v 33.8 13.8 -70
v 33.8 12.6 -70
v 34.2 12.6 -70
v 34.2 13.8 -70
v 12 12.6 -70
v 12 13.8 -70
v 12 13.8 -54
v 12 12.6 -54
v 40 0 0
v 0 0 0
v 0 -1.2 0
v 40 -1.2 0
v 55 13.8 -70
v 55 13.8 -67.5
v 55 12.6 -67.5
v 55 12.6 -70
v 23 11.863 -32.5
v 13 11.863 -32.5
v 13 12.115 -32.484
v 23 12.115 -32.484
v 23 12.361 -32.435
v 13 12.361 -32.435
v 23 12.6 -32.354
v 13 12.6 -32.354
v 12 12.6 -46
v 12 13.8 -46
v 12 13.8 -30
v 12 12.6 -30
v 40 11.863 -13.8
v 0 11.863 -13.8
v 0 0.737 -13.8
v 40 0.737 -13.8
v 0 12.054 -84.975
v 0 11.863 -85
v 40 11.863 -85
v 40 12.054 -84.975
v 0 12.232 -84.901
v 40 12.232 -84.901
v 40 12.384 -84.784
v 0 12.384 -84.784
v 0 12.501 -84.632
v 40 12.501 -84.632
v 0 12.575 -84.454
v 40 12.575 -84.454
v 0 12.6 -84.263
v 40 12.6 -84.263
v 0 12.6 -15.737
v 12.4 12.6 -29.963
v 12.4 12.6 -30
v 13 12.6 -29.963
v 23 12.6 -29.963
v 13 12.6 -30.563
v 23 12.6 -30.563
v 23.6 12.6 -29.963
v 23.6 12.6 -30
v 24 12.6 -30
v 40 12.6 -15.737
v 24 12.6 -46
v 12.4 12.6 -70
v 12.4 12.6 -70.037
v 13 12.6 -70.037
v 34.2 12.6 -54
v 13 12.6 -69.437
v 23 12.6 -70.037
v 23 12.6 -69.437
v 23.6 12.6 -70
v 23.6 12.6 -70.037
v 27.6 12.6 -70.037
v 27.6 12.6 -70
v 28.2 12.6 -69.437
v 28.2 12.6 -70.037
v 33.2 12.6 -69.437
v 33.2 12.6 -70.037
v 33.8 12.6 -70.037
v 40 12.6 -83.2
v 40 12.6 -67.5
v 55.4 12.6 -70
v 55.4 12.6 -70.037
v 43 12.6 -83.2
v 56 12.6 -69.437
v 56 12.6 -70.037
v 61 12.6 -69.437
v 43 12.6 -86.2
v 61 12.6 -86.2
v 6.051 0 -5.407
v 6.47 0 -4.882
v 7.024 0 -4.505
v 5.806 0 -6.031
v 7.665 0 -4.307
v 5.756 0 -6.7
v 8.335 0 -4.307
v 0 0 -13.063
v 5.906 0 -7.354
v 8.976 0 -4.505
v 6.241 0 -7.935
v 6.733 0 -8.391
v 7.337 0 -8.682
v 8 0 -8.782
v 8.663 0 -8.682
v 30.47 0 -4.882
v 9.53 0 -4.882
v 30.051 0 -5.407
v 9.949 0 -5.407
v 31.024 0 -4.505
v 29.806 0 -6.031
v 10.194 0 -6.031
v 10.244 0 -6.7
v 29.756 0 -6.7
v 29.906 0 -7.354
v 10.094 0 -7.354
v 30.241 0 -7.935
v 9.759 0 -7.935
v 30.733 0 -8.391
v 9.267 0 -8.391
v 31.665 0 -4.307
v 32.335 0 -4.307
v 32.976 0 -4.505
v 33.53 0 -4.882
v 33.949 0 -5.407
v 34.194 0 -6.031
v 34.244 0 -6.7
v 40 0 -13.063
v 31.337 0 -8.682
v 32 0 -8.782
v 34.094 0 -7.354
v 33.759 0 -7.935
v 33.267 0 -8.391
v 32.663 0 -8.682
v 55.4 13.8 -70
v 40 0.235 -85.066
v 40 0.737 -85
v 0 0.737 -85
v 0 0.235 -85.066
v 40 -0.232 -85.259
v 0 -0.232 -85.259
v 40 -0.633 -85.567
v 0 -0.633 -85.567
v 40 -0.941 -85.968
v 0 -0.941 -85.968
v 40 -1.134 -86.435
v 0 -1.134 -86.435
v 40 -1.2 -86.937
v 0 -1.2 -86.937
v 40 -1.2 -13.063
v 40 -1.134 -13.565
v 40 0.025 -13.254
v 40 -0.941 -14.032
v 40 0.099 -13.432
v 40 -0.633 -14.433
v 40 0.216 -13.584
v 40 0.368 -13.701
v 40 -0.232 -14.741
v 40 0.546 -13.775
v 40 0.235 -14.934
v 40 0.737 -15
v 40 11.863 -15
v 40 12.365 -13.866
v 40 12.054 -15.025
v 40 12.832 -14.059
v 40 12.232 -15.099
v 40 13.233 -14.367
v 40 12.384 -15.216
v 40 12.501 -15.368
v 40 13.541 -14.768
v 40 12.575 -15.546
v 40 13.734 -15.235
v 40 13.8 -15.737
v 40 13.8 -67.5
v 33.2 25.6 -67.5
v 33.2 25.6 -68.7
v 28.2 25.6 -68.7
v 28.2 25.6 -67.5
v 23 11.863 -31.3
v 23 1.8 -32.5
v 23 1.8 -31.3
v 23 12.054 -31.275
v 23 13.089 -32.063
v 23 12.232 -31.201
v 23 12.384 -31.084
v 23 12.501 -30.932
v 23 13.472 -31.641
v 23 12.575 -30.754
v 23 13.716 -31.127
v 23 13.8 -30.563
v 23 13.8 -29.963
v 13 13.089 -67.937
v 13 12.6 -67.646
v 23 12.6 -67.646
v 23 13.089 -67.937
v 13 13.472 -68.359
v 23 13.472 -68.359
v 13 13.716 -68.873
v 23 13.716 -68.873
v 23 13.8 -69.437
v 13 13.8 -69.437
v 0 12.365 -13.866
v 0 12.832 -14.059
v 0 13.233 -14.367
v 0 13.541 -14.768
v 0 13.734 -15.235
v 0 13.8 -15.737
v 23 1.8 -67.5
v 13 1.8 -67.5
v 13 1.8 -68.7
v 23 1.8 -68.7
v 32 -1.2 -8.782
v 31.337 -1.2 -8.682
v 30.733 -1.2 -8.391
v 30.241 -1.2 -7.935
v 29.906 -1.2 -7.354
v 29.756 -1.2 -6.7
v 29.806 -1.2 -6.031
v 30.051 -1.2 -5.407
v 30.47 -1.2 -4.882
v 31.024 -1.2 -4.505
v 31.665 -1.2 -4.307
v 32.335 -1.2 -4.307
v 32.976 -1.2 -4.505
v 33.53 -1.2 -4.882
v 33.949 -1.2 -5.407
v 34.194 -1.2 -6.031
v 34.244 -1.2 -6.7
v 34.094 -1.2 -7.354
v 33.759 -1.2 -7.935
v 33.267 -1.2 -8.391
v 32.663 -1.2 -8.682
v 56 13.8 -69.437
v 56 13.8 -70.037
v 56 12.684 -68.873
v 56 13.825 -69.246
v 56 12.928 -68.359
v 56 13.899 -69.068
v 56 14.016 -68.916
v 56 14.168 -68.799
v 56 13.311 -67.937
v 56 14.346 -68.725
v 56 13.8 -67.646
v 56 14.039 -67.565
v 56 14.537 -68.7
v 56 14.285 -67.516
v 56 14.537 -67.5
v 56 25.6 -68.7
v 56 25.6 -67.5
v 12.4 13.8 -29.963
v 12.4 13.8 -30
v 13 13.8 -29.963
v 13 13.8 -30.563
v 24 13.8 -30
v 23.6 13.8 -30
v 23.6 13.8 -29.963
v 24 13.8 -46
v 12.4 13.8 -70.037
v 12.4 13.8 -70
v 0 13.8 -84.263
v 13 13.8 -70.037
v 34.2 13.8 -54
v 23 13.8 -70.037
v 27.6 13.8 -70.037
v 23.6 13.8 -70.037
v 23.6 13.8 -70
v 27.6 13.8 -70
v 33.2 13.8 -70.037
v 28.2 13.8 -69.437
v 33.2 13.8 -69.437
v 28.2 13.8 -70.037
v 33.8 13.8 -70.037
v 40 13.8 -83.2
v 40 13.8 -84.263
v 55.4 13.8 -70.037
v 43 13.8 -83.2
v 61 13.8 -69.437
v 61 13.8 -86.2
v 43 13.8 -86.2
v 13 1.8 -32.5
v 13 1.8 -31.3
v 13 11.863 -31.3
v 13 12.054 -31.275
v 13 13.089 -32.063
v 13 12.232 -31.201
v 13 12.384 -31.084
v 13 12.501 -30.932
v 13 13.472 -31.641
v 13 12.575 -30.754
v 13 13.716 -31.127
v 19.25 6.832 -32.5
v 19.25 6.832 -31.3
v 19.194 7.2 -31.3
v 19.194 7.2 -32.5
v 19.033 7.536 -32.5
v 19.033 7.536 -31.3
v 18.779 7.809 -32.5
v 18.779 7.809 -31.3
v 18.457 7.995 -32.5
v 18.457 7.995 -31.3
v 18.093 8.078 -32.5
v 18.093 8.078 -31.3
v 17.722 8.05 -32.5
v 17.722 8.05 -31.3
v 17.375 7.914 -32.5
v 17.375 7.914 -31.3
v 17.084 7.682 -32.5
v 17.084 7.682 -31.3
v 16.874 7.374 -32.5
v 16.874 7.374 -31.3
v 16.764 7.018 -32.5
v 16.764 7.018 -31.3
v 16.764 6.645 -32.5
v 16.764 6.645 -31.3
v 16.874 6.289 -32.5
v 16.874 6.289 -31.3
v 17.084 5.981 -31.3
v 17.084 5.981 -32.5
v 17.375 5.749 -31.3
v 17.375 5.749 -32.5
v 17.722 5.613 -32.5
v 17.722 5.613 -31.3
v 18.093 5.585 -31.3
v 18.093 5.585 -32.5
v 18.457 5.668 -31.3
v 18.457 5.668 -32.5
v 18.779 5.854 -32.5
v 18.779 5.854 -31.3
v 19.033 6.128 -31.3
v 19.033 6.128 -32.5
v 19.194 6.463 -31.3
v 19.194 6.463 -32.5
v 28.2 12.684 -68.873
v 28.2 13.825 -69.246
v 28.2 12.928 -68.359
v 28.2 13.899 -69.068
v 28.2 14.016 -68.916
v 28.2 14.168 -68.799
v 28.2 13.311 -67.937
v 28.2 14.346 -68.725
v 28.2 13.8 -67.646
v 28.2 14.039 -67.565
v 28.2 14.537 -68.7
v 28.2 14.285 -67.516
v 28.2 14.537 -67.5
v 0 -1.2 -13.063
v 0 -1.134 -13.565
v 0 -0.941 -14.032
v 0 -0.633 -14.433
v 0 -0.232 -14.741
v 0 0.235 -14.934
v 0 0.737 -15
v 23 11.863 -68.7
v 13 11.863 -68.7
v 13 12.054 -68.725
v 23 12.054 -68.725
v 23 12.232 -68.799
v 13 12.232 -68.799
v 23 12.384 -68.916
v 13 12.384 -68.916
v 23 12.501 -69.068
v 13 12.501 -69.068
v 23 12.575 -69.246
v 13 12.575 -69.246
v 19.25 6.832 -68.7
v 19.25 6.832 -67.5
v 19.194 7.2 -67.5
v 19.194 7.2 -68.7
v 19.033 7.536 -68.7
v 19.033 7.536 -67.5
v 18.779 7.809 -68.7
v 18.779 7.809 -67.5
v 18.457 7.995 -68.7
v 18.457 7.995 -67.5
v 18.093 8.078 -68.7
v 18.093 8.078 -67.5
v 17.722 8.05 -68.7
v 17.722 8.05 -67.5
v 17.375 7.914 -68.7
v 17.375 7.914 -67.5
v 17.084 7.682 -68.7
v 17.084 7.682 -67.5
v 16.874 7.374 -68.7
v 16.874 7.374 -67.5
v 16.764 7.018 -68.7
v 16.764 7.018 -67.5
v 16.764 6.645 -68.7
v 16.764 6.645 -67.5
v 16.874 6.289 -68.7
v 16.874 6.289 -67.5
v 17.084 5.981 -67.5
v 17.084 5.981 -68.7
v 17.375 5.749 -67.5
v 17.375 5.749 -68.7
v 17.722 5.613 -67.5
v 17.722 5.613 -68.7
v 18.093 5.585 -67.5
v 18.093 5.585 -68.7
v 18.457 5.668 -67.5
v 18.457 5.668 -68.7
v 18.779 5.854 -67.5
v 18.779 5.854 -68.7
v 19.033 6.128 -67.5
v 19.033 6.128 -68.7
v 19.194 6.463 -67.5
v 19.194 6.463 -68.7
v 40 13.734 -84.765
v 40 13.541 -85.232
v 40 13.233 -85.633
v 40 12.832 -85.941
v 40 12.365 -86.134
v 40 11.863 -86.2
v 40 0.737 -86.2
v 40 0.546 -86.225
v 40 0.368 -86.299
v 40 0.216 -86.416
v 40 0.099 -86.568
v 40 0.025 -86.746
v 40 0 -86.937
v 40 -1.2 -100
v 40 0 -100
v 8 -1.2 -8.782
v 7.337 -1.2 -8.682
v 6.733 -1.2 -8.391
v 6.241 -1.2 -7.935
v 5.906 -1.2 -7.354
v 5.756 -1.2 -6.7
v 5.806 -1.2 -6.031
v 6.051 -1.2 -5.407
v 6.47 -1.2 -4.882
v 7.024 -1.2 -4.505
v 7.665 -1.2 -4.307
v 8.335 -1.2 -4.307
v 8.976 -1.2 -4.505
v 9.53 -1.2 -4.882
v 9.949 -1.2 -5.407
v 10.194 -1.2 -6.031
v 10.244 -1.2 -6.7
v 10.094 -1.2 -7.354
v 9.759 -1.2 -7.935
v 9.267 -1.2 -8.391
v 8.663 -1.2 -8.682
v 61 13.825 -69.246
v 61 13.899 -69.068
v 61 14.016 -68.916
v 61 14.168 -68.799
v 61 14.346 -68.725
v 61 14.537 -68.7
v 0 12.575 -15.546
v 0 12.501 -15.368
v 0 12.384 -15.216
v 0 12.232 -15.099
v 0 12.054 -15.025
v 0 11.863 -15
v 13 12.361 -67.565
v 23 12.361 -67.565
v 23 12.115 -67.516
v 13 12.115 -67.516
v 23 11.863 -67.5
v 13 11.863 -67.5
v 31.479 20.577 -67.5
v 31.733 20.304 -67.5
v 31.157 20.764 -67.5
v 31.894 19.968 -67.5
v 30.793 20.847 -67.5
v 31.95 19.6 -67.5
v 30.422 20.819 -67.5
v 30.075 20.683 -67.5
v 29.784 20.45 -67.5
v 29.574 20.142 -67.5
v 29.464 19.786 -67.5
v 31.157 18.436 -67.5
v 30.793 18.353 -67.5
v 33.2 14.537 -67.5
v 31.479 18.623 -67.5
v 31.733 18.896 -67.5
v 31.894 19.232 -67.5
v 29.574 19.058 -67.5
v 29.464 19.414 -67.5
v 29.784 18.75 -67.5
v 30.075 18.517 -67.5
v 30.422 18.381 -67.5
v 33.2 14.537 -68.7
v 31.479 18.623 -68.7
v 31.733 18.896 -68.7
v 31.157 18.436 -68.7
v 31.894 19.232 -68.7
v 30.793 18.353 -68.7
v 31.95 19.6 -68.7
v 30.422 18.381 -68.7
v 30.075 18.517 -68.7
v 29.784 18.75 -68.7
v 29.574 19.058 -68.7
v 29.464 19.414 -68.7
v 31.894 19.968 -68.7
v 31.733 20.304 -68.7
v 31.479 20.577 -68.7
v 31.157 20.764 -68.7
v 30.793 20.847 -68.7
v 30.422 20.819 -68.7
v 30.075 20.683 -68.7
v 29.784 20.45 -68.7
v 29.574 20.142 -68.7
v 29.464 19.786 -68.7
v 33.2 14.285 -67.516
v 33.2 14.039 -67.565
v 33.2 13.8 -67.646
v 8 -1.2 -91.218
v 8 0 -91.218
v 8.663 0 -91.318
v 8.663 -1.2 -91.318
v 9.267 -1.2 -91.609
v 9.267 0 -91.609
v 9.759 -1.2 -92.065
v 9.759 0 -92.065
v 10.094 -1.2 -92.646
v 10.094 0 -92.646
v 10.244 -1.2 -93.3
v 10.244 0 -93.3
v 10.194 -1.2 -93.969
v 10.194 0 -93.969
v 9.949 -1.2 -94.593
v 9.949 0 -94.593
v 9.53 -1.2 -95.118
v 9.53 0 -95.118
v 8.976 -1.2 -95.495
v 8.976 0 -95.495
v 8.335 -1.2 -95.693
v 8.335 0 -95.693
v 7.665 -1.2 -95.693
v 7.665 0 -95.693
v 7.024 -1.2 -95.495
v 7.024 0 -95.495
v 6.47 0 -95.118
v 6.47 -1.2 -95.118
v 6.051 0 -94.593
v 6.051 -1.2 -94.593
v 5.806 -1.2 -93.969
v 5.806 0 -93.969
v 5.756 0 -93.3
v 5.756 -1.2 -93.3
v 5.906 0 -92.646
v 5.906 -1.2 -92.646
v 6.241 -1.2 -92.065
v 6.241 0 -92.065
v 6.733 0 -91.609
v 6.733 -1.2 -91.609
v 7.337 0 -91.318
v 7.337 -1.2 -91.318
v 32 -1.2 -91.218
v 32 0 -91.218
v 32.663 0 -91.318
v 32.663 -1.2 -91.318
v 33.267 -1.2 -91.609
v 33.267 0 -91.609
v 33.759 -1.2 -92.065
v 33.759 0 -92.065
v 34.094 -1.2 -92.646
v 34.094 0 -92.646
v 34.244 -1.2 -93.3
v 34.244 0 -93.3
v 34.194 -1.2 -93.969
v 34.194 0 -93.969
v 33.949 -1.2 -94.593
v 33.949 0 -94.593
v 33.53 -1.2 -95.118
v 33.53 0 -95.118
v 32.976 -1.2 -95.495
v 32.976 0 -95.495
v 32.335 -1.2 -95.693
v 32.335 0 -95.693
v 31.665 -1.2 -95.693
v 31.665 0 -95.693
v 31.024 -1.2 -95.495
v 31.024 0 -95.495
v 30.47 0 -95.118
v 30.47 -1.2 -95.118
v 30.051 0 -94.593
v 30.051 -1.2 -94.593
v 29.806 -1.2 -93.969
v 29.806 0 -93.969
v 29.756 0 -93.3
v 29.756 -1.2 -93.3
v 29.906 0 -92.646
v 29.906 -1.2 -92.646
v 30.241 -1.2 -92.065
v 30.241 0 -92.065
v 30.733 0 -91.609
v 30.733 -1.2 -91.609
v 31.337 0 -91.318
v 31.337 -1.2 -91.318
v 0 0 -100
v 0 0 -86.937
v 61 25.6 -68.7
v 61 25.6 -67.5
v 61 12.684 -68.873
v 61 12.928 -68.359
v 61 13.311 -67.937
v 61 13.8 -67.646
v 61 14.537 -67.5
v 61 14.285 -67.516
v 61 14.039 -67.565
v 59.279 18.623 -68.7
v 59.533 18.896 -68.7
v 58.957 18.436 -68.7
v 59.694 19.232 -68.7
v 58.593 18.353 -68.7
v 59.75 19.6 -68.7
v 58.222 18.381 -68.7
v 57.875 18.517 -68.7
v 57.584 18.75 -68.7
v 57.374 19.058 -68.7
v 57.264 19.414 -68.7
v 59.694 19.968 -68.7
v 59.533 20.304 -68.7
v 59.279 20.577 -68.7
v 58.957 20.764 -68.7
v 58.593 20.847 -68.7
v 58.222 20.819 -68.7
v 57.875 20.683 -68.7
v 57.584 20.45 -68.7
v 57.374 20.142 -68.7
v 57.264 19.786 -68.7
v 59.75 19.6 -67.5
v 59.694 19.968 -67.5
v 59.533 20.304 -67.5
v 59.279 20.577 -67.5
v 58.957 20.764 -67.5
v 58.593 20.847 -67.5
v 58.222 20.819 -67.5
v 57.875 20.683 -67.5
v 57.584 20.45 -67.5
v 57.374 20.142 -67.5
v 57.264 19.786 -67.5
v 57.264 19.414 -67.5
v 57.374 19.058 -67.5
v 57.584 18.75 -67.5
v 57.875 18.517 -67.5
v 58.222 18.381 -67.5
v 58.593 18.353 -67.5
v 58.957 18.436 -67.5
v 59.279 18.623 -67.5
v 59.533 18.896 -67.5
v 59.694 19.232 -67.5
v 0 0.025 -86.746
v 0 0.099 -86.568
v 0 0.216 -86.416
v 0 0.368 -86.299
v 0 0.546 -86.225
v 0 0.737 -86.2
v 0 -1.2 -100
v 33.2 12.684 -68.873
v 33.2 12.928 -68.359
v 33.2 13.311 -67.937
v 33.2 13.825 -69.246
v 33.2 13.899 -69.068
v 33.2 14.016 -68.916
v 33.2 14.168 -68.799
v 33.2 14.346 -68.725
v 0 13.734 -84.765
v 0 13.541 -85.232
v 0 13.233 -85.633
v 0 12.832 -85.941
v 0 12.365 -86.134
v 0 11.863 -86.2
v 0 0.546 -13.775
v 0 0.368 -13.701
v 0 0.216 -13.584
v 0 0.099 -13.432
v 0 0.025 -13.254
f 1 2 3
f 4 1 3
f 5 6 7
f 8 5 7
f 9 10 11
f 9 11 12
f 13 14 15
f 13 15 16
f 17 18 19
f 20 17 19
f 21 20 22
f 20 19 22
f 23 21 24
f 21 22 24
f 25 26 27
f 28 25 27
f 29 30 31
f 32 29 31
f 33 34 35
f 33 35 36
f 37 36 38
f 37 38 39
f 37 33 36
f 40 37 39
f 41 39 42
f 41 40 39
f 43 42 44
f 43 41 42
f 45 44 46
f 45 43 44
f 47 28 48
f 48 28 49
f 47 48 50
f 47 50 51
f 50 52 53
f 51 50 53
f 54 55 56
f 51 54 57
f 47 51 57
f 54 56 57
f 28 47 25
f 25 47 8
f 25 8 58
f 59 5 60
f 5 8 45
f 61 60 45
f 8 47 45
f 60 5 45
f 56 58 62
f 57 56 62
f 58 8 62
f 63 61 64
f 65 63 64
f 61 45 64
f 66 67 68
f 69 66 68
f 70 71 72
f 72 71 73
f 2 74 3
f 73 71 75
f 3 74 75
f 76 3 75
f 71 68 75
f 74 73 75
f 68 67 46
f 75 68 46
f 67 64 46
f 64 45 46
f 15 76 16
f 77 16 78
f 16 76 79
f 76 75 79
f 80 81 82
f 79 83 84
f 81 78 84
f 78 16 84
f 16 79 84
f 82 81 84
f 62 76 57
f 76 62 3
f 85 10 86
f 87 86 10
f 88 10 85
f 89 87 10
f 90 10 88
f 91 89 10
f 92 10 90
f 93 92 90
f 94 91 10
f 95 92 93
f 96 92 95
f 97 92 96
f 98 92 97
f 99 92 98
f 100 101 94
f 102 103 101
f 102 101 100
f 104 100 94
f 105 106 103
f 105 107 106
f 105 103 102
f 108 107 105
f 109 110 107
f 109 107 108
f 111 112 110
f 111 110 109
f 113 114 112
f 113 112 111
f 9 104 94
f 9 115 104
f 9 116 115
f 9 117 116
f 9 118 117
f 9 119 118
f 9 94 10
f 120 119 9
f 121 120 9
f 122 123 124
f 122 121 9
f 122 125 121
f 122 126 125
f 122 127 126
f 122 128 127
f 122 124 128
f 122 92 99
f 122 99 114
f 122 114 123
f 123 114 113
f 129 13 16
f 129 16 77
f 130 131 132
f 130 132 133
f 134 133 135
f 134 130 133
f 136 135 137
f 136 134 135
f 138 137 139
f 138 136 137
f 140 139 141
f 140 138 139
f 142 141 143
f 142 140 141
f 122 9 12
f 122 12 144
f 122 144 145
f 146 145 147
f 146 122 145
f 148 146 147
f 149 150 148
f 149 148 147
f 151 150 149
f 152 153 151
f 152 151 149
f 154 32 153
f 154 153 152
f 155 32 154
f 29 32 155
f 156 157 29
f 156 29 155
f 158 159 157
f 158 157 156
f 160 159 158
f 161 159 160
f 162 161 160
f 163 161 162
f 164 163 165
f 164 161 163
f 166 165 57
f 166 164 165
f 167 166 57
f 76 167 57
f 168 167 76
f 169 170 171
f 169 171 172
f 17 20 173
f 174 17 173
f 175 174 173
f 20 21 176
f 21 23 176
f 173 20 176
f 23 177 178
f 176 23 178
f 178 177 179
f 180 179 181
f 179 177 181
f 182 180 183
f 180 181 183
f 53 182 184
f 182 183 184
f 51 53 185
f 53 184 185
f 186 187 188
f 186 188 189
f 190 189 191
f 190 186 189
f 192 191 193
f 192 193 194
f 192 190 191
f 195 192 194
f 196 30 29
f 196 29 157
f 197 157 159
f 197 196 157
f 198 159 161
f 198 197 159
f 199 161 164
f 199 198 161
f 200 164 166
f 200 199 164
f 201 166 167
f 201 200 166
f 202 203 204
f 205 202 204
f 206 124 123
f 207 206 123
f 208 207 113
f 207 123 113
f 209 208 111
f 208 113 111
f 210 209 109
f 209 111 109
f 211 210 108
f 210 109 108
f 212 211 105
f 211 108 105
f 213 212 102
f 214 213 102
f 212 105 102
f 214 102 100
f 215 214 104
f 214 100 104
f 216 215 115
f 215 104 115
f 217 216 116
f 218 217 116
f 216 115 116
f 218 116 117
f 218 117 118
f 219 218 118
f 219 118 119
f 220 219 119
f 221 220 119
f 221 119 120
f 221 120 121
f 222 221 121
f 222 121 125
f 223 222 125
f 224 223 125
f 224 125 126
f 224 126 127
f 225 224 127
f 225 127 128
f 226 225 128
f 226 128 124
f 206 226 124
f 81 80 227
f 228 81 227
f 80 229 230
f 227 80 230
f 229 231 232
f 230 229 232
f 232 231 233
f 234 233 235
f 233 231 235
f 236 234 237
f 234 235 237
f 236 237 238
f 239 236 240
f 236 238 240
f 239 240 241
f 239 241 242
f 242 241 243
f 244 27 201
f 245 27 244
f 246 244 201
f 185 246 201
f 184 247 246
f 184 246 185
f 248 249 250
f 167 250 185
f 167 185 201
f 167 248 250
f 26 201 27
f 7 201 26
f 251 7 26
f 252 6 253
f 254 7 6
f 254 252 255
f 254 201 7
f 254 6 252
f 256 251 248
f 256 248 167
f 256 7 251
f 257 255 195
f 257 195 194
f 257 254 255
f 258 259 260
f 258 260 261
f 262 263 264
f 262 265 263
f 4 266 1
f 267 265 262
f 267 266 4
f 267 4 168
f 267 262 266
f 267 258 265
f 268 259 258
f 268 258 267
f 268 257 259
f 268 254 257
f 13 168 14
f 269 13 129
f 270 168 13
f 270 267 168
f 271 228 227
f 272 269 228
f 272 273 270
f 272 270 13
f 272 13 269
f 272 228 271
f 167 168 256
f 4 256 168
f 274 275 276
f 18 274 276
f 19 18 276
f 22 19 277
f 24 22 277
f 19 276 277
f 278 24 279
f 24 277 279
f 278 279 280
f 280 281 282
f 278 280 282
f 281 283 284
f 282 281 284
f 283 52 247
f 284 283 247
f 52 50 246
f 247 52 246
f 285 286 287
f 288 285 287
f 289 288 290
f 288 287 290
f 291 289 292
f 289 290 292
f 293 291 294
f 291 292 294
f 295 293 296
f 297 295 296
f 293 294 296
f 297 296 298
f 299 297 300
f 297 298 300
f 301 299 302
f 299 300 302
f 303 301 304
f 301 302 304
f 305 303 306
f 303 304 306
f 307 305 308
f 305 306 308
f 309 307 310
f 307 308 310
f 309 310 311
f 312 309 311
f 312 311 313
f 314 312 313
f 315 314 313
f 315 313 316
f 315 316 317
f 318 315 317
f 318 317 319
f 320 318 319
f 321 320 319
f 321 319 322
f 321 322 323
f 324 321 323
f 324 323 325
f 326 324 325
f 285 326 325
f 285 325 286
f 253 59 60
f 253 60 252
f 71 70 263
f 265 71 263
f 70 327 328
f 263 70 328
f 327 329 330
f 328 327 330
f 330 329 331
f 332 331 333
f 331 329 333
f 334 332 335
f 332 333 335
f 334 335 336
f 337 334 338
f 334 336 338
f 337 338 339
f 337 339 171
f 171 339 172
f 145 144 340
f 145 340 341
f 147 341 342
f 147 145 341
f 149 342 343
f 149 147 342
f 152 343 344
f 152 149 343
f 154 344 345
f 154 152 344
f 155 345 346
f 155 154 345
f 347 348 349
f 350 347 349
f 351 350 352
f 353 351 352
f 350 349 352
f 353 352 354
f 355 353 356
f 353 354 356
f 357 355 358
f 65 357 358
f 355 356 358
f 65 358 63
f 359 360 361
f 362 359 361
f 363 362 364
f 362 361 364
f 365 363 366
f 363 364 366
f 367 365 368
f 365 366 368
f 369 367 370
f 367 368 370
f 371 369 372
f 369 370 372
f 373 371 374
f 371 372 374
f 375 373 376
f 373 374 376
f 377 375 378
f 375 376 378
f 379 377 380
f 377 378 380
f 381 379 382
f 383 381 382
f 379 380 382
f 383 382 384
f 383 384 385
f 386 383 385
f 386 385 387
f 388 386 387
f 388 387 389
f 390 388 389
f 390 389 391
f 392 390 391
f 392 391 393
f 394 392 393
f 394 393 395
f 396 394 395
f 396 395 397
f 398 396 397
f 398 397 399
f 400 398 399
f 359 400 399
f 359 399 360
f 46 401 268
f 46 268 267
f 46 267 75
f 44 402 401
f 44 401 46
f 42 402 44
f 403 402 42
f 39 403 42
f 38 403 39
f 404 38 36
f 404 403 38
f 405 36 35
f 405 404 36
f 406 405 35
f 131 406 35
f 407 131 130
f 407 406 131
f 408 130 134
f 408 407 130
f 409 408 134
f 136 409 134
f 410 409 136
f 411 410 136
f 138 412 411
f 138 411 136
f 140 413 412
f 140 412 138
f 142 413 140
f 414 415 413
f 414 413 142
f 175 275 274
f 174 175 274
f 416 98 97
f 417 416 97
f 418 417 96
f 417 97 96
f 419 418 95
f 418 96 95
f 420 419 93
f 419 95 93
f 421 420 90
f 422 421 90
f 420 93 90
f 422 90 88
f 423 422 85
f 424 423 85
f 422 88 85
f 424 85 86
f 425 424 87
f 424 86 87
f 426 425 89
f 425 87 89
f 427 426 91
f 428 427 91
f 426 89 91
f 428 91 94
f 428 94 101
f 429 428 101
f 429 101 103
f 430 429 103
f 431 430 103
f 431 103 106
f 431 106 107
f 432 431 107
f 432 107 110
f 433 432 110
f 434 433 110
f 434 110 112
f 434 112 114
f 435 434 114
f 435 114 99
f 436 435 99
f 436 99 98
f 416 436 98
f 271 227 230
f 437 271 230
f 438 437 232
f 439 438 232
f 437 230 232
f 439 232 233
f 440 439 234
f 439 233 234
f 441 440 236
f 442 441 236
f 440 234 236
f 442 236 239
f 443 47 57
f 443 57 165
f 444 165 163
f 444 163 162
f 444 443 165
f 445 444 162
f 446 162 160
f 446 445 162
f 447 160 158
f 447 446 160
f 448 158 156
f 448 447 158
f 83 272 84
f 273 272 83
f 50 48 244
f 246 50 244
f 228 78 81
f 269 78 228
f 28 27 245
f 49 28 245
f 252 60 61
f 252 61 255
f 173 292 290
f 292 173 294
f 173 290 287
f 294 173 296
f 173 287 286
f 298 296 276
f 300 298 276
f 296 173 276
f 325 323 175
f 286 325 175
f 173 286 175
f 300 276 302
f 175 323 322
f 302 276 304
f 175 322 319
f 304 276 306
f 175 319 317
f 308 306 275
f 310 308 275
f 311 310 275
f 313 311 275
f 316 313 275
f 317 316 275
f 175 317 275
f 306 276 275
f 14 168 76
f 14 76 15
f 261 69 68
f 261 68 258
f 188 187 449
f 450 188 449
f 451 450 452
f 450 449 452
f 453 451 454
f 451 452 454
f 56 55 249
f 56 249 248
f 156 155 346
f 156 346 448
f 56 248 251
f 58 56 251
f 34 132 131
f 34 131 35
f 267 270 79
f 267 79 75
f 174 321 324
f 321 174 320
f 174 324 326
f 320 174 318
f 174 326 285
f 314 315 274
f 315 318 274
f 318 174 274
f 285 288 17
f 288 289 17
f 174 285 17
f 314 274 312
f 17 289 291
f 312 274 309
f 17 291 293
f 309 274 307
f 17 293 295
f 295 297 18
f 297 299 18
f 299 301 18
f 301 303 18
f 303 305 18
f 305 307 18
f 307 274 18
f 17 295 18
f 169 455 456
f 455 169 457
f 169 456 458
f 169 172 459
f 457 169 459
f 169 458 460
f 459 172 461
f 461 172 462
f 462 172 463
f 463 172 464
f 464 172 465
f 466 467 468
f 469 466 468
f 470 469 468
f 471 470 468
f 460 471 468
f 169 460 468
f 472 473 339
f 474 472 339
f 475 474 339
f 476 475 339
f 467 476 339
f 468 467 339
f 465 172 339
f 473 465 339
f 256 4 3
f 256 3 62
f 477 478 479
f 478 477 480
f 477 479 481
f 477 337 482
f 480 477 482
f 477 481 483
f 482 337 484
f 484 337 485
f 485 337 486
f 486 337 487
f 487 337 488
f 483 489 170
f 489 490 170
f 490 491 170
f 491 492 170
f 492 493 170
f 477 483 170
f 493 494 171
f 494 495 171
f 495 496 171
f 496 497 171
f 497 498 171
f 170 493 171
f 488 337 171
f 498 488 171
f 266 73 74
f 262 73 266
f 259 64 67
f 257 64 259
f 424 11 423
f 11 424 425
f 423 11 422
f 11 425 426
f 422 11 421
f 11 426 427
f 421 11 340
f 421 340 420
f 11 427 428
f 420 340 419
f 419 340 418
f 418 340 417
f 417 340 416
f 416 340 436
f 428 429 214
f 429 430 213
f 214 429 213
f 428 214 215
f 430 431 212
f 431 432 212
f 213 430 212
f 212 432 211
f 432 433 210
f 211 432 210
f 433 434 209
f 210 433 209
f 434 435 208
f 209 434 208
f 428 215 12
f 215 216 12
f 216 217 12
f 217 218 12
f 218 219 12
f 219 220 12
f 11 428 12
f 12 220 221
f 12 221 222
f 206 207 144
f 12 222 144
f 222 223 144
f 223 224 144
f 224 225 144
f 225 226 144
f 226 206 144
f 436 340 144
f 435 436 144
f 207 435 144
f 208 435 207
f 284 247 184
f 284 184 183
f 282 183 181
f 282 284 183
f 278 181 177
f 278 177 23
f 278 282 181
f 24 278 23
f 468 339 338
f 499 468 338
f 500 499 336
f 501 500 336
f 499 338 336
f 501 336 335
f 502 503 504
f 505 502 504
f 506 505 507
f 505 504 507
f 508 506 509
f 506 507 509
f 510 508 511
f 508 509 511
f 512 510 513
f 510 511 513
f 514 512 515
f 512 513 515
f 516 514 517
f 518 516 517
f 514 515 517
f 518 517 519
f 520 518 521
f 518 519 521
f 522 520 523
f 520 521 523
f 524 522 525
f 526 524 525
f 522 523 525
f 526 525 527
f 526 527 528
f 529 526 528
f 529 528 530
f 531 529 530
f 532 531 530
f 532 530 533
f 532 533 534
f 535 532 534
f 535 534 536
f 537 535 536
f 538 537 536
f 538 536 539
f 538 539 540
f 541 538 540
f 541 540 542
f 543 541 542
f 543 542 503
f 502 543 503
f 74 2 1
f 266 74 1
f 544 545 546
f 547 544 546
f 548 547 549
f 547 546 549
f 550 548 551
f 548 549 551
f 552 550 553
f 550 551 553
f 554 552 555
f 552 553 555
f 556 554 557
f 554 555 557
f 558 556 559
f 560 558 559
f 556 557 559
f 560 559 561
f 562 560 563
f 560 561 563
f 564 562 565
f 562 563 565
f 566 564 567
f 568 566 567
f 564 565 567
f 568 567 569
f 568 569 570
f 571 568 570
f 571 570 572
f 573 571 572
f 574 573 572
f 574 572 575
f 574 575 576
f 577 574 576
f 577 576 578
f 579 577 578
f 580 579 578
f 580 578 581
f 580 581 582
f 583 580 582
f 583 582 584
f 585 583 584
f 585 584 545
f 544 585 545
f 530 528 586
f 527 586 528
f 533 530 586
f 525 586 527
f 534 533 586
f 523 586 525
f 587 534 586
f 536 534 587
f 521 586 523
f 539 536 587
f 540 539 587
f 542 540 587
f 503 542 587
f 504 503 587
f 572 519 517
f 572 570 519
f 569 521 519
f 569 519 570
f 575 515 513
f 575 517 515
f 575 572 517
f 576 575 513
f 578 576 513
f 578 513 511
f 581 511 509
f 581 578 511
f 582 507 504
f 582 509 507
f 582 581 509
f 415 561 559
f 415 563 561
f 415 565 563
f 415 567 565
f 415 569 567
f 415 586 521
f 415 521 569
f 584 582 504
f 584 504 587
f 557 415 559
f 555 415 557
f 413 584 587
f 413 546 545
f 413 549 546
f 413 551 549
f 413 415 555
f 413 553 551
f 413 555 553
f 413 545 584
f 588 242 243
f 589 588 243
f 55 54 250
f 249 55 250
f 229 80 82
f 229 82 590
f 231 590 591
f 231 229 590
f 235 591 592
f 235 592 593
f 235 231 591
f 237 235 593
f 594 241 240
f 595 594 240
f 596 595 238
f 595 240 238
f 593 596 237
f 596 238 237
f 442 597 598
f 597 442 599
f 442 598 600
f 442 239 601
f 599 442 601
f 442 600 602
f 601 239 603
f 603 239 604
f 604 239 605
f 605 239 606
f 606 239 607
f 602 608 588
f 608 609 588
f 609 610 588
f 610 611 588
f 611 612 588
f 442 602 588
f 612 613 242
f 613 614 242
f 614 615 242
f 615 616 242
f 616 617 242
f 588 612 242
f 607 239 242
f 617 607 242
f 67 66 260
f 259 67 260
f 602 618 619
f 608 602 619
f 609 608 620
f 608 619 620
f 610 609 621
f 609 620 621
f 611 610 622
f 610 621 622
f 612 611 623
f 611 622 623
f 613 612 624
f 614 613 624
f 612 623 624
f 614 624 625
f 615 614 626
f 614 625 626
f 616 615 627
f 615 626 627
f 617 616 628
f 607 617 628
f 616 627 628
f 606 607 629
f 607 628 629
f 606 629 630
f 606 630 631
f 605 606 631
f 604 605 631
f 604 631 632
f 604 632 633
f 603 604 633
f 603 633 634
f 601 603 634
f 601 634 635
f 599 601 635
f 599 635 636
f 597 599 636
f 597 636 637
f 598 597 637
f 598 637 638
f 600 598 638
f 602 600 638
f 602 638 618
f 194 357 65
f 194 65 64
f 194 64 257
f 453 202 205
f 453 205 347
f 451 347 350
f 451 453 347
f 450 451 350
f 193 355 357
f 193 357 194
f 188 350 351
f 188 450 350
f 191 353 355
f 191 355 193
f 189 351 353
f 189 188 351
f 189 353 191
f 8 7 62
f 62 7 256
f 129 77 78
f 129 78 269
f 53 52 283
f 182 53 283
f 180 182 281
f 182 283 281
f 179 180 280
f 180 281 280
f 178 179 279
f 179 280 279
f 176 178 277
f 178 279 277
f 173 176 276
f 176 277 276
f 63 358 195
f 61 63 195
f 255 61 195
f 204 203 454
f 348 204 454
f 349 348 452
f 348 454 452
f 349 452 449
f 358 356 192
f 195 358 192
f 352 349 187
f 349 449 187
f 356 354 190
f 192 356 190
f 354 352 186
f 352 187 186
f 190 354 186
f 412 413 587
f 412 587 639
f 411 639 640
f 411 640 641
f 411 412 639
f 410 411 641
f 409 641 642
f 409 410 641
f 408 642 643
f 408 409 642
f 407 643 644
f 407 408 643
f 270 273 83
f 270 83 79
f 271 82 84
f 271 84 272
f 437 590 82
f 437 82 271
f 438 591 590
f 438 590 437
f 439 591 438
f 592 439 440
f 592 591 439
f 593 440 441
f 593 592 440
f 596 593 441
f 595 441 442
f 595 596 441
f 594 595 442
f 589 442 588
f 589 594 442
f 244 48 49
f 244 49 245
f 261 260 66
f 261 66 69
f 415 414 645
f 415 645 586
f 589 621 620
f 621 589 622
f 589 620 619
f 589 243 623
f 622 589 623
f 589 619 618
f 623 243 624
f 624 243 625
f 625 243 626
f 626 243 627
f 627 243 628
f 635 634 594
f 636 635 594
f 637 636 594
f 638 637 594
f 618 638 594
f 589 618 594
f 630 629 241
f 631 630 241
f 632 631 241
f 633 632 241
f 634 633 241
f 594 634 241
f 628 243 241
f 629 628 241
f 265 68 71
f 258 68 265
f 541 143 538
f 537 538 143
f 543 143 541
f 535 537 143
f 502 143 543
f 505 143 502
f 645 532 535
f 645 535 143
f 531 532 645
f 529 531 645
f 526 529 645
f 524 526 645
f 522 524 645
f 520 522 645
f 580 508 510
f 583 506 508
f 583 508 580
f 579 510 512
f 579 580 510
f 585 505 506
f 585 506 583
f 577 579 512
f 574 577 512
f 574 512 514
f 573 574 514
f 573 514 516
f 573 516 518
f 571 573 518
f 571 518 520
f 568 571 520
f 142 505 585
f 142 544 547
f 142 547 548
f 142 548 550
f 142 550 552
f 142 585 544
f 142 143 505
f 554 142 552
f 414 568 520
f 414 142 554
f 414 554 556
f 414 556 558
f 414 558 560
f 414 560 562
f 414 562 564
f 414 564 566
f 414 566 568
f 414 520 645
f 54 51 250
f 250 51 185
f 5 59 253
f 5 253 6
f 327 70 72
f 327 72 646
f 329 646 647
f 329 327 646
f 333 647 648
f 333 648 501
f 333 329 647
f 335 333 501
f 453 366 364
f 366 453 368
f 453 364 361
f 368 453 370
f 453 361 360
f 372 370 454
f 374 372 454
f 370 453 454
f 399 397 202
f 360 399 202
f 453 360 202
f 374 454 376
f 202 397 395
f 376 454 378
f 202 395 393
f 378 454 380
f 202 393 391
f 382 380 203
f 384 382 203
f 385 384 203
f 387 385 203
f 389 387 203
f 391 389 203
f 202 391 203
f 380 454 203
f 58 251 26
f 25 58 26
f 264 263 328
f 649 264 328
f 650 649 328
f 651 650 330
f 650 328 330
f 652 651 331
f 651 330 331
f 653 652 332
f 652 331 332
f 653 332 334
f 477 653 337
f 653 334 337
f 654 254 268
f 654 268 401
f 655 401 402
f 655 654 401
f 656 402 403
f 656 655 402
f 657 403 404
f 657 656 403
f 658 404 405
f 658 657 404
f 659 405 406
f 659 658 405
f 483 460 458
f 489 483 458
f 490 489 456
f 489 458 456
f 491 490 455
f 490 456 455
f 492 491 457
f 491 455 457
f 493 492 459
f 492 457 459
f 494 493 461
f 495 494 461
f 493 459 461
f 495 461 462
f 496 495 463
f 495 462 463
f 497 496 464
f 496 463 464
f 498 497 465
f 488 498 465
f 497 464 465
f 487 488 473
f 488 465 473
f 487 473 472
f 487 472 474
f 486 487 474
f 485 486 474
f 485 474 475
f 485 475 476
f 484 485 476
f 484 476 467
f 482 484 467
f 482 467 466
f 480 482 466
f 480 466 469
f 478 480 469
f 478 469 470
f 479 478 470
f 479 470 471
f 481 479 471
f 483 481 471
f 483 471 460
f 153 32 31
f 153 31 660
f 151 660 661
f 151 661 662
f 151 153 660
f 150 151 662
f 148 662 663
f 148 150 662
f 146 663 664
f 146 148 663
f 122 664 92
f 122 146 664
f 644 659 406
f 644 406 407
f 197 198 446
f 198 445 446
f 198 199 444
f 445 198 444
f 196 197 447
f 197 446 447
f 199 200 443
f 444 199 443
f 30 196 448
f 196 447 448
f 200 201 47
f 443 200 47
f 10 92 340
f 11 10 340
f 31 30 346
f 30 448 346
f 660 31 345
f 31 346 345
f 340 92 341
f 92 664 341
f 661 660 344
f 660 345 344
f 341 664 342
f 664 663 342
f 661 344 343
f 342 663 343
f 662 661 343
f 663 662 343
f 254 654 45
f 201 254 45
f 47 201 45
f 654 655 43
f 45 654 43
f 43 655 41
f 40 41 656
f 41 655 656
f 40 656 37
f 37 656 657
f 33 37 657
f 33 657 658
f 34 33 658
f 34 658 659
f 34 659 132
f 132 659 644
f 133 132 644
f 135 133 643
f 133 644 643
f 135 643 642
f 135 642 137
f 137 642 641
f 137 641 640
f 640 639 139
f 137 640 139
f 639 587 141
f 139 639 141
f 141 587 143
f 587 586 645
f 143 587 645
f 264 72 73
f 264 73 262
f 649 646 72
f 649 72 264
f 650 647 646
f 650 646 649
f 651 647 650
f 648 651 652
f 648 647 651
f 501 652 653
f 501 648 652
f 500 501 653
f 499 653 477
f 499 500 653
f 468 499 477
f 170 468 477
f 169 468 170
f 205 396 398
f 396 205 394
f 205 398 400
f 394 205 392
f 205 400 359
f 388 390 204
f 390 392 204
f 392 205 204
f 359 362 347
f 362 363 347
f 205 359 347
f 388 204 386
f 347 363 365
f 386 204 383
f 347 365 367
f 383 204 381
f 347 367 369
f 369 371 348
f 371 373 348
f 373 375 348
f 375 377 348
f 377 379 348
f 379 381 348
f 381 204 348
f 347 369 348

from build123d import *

# Parameters (mm, degrees)
SKETCH_1_W                       = 40
SKETCH_1_H                       = 15
SM_BASE_FLANGE_1_DEPTH           = 1.2
SM_EDGE_FLANGE_1_STRIP_W         = 6.2732
SM_EDGE_FLANGE_1_STRIP_H         = 1.2
SM_EDGE_FLANGE_1_STRIP_CUT_DEPTH = 40
SM_EDGE_FLANGE_1_DEPTH           = 40
SM_EDGE_FLANGE_2_STRIP_W         = 6.2732
SM_EDGE_FLANGE_2_STRIP_H         = 1.2
SM_EDGE_FLANGE_2_STRIP_CUT_DEPTH = 40
SM_EDGE_FLANGE_2_DEPTH           = 40
SM_EDGE_FLANGE_2_FLAT_DEPTH      = 1.2
SM_EDGE_FLANGE_3_STRIP_W         = 6.2732
SM_EDGE_FLANGE_3_STRIP_H         = 1.2
SM_EDGE_FLANGE_3_STRIP_CUT_DEPTH = 40
SM_EDGE_FLANGE_3_DEPTH           = 40
SM_EDGE_FLANGE_4_STRIP_W         = 6.2732
SM_EDGE_FLANGE_4_STRIP_H         = 1.2
SM_EDGE_FLANGE_4_STRIP_CUT_DEPTH = 40
SM_EDGE_FLANGE_4_DEPTH           = 40
CUT_EXTRUDE_1_DEPTH              = 10
SM_START                         = 13
SM_EDGE_FLANGE_5_DEPTH           = 10
SM_START_2                       = 12.4
SM_EDGE_FLANGE_5_2_OUTLINE_W     = 1.2
SM_EDGE_FLANGE_5_2_OUTLINE_H     = 0.0366
SM_EDGE_FLANGE_5_2_DEPTH         = 0.6
SM_START_3                       = 23
SM_EDGE_FLANGE_5_3_OUTLINE_W     = 1.2
SM_EDGE_FLANGE_5_3_OUTLINE_H     = 0.0366
SM_EDGE_FLANGE_5_3_DEPTH         = 0.6
SM_EDGE_FLANGE_5_4_DEPTH         = 10
SKETCH_26_R                      = 1.25
CUT_EXTRUDE_2_DEPTH              = 46
CUT_EXTRUDE_3_REACH              = 120.093
SKETCH_28_W                      = 1
SKETCH_28_H                      = 2.5
SM_START_4                       = 28.2
SM_EDGE_FLANGE_6_DEPTH           = 5
SM_START_5                       = 56
SM_EDGE_FLANGE_6_2_DEPTH         = 5
SM_START_6                       = 27.6
SM_EDGE_FLANGE_6_3_OUTLINE_W     = 1.2
SM_EDGE_FLANGE_6_3_OUTLINE_H     = 0.0366
SM_EDGE_FLANGE_6_3_DEPTH         = 0.6
SM_START_7                       = 33.2
SM_EDGE_FLANGE_6_4_OUTLINE_W     = 1.2
SM_EDGE_FLANGE_6_4_OUTLINE_H     = 0.0366
SM_EDGE_FLANGE_6_4_DEPTH         = 0.6
SM_START_8                       = 55.4
SM_EDGE_FLANGE_6_5_OUTLINE_W     = 1.2
SM_EDGE_FLANGE_6_5_OUTLINE_H     = 0.0366
SM_EDGE_FLANGE_6_5_DEPTH         = 0.6
SM_EDGE_FLANGE_6_6_DEPTH         = 5
SM_EDGE_FLANGE_6_7_DEPTH         = 5
CUT_EXTRUDE_4_REACH              = 96.512
SKETCH_35_R                      = 1.25
CUT_EXTRUDE_5_REACH              = 120.093
SKETCH_36_R                      = 2.25


# Read off the part's stored shape, not the designer's step: Ребро-кромка5, Ребро-кромка6
# Sheet-metal steps are written as plain solids
with BuildPart() as part:
    # Sketch 1 → Базовая кромка1 (new body)
    with BuildSketch(Plane(origin=(0, 0, 0), x_dir=(1, 0, 0), z_dir=(0, 1, 0))):
        with Locations((20, 7.5)):
            Rectangle(SKETCH_1_W, SKETCH_1_H)
    extrude(amount=-SM_BASE_FLANGE_1_DEPTH)

    # Ребро-кромка1 strip (across the edge) → Ребро-кромка1 strip cut (cut)
    with BuildSketch(Plane(origin=(40, 0, -15), x_dir=(0, 0, 1), z_dir=(-1, 0, 0))):
        with Locations((-1.2, -0.6)):
            Rectangle(SM_EDGE_FLANGE_1_STRIP_W, SM_EDGE_FLANGE_1_STRIP_H)
    extrude(amount=SM_EDGE_FLANGE_1_STRIP_CUT_DEPTH, mode=Mode.SUBTRACT)

    # Ребро-кромка1 section (across the edge) → Ребро-кромка1 (add)
    with BuildSketch(Plane(origin=(40, 0, -15), x_dir=(0, 0, 1), z_dir=(-1, 0, 0))):
        with BuildLine():
            Line((0, 0.7366), (0, 13.8))
            Line((0, 13.8), (1.2, 13.8))
            Line((1.2, 13.8), (1.2, 0.7366))
            ThreePointArc((1.2, 0.7366), (1.415745145, 0.215745145), (1.9366, 0))
            Line((1.9366, 0), (1.9366, -1.2))
            ThreePointArc((1.9366, -1.2), (0.567217008, -0.632782992), (0, 0.7366))
        make_face()
    extrude(amount=SM_EDGE_FLANGE_1_DEPTH)

    # Ребро-кромка2 strip (across the edge) → Ребро-кромка2 strip cut (cut)
    with BuildSketch(Plane(origin=(0, 13.8, -15), x_dir=(0, -1, 0), z_dir=(1, 0, 0))):
        with Locations((-1.2, -0.6)):
            Rectangle(SM_EDGE_FLANGE_2_STRIP_W, SM_EDGE_FLANGE_2_STRIP_H)
    extrude(amount=SM_EDGE_FLANGE_2_STRIP_CUT_DEPTH, mode=Mode.SUBTRACT)

    # Ребро-кромка2 bend section (across the edge) → Ребро-кромка2 (add)
    with BuildSketch(Plane(origin=(0, 13.8, -15), x_dir=(0, -1, 0), z_dir=(1, 0, 0))):
        with BuildLine():
            Line((0, 0.7366), (1.2, 0.7366))
            ThreePointArc((1.2, 0.7366), (1.415745145, 0.215745145), (1.9366, 0))
            Line((1.9366, 0), (1.9366, -1.2))
            ThreePointArc((1.9366, -1.2), (0.567217008, -0.632782992), (0, 0.7366))
        make_face()
    extrude(amount=SM_EDGE_FLANGE_2_DEPTH)

    # Ребро-кромка2 profile (on flange) → Ребро-кромка2 flat (add)
    with BuildSketch(Plane(origin=(0, 13.8, -15), x_dir=(1, 0, 0), z_dir=(0, 1, 0))):
        Polygon((43, 71.2), (43, 68.2), (40, 68.2), (40, 71.2), (0, 71.2), (0, 0.7366), (40, 0.7366), (40, 52.5), (61, 52.5), (61, 71.2), align=None)
    extrude(amount=-SM_EDGE_FLANGE_2_FLAT_DEPTH)

    # Ребро-кромка3 strip (across the edge) → Ребро-кромка3 strip cut (cut)
    with BuildSketch(Plane(origin=(0, 12.6, -86.2), x_dir=(0, 0, 1), z_dir=(1, 0, 0))):
        with Locations((-1.2, -0.6)):
            Rectangle(SM_EDGE_FLANGE_3_STRIP_W, SM_EDGE_FLANGE_3_STRIP_H)
    extrude(amount=SM_EDGE_FLANGE_3_STRIP_CUT_DEPTH, mode=Mode.SUBTRACT)

    # Ребро-кромка3 section (across the edge) → Ребро-кромка3 (add)
    with BuildSketch(Plane(origin=(0, 12.6, -86.2), x_dir=(0, 0, 1), z_dir=(1, 0, 0))):
        with BuildLine():
            Line((0, 0.7366), (0, 13.8))
            Line((0, 13.8), (1.2, 13.8))
            Line((1.2, 13.8), (1.2, 0.7366))
            ThreePointArc((1.2, 0.7366), (1.415745145, 0.215745145), (1.9366, 0))
            Line((1.9366, 0), (1.9366, -1.2))
            ThreePointArc((1.9366, -1.2), (0.567217008, -0.632782992), (0, 0.7366))
        make_face()
    extrude(amount=SM_EDGE_FLANGE_3_DEPTH)

    # Ребро-кромка4 strip (across the edge) → Ребро-кромка4 strip cut (cut)
    with BuildSketch(Plane(origin=(40, -1.2, -86.2), x_dir=(0, 1, 0), z_dir=(-1, 0, 0))):
        with Locations((-1.2, -0.6)):
            Rectangle(SM_EDGE_FLANGE_4_STRIP_W, SM_EDGE_FLANGE_4_STRIP_H)
    extrude(amount=SM_EDGE_FLANGE_4_STRIP_CUT_DEPTH, mode=Mode.SUBTRACT)

    # Ребро-кромка4 section (across the edge) → Ребро-кромка4 (add)
    with BuildSketch(Plane(origin=(40, -1.2, -86.2), x_dir=(0, 1, 0), z_dir=(-1, 0, 0))):
        with BuildLine():
            Line((0, 0.7366), (0, 13.8))
            Line((0, 13.8), (1.2, 13.8))
            Line((1.2, 13.8), (1.2, 0.7366))
            ThreePointArc((1.2, 0.7366), (1.415745145, 0.215745145), (1.9366, 0))
            Line((1.9366, 0), (1.9366, -1.2))
            ThreePointArc((1.9366, -1.2), (0.567217008, -0.632782992), (0, 0.7366))
        make_face()
    extrude(amount=SM_EDGE_FLANGE_4_DEPTH)

    # Эскиз19 → Вырез-Вытянуть1 (cut)
    with BuildSketch(Plane(origin=(0, 13.8, 0), x_dir=(1, 0, 0), z_dir=(0, 1, 0))):
        Polygon((13, 32.5), (23, 32.5), (23, 30), (24, 30), (24, 46), (12, 46), (12, 30), (13, 30), align=None)
        Polygon((12, 54), (24, 54), (24, 70), (23, 70), (23, 67.5), (13, 67.5), (13, 70), (12, 70), align=None)
    extrude(amount=-CUT_EXTRUDE_1_DEPTH, mode=Mode.SUBTRACT)

    # Ребро-кромка5 outline → Ребро-кромка5 (cut)
    with BuildSketch(Plane.YZ.offset(SM_START)):
        with BuildLine():
            Line((12.6, -67.5), (12.6, -67.645555612))
            ThreePointArc((12.6, -67.645555612), (13.472269031, -68.358657516), (13.8, -69.4366))
            Line((13.8, -69.4366), (13.8, -67.5))
            Line((13.8, -67.5), (12.6, -67.5))
        make_face()
        with BuildLine():
            Line((12.6, -32.354444388), (12.6, -32.5))
            Line((12.6, -32.5), (13.8, -32.5))
            Line((13.8, -32.5), (13.8, -30.5634))
            ThreePointArc((13.8, -30.5634), (13.472269031, -31.641342484), (12.6, -32.354444388))
        make_face()
    extrude(amount=SM_EDGE_FLANGE_5_DEPTH, mode=Mode.SUBTRACT)

    # Sm Edge Flange 5 2 outline → Sm Edge Flange 5 2 (cut)
    with BuildSketch(Plane.YZ.offset(SM_START_2)):
        with Locations((13.2, -70.0183)):
            Rectangle(SM_EDGE_FLANGE_5_2_OUTLINE_W, SM_EDGE_FLANGE_5_2_OUTLINE_H)
        with Locations((13.2, -29.9817)):
            Rectangle(SM_EDGE_FLANGE_5_2_OUTLINE_W, SM_EDGE_FLANGE_5_2_OUTLINE_H)
    extrude(amount=SM_EDGE_FLANGE_5_2_DEPTH, mode=Mode.SUBTRACT)

    # Sm Edge Flange 5 3 outline → Sm Edge Flange 5 3 (cut)
    with BuildSketch(Plane.YZ.offset(SM_START_3)):
        with Locations((13.2, -70.0183)):
            Rectangle(SM_EDGE_FLANGE_5_3_OUTLINE_W, SM_EDGE_FLANGE_5_3_OUTLINE_H)
        with Locations((13.2, -29.9817)):
            Rectangle(SM_EDGE_FLANGE_5_3_OUTLINE_W, SM_EDGE_FLANGE_5_3_OUTLINE_H)
    extrude(amount=SM_EDGE_FLANGE_5_3_DEPTH, mode=Mode.SUBTRACT)

    # Sm Edge Flange 5 4 outline → Sm Edge Flange 5 4 (add)
    with BuildSketch(Plane.YZ.offset(SM_START)):
        with BuildLine():
            Line((11.8634, -67.5), (1.8, -67.5))
            Line((1.8, -67.5), (1.8, -68.7))
            Line((1.8, -68.7), (11.8634, -68.7))
            ThreePointArc((11.8634, -68.7), (12.384254855, -68.915745145), (12.6, -69.4366))
            Line((12.6, -69.4366), (12.6, -67.645555612))
            ThreePointArc((12.6, -67.645555612), (12.238821762, -67.536737358), (11.8634, -67.5))
        make_face()
        with BuildLine():
            ThreePointArc((11.8634, -32.5), (12.238821762, -32.463262642), (12.6, -32.354444388))
            Line((12.6, -32.354444388), (12.6, -30.5634))
            ThreePointArc((12.6, -30.5634), (12.384254855, -31.084254855), (11.8634, -31.3))
            Line((11.8634, -31.3), (1.8, -31.3))
            Line((1.8, -31.3), (1.8, -32.5))
            Line((1.8, -32.5), (11.8634, -32.5))
        make_face()
    extrude(amount=SM_EDGE_FLANGE_5_4_DEPTH)

    # Эскиз26 → Вырез-Вытянуть2 (cut)
    with BuildSketch(Plane.XY.offset(-31.3)):
        with Locations((18, 6.8317)):
            Circle(SKETCH_26_R)
    extrude(amount=-CUT_EXTRUDE_2_DEPTH, mode=Mode.SUBTRACT)

    # Эскиз28 → Вырез-Вытянуть3 (cut, up to next)
    with BuildSketch(Plane(origin=(0, 13.8, 0), x_dir=(1, 0, 0), z_dir=(0, 1, 0)), mode=Mode.PRIVATE) as cut_extrude_3_sk1:
        with Locations((55.5, 68.75)):
            Rectangle(SKETCH_28_W, SKETCH_28_H)
    cut_extrude_3_tool1 = extrude(cut_extrude_3_sk1.sketch, amount=-CUT_EXTRUDE_3_REACH, mode=Mode.PRIVATE) & part.part
    # Эскиз28 → Вырез-Вытянуть3 (cut, up to next)
    with BuildSketch(Plane(origin=(0, 13.8, 0), x_dir=(1, 0, 0), z_dir=(0, 1, 0)), mode=Mode.PRIVATE) as cut_extrude_3_sk2:
        Polygon((28.2, 67.5), (33.2, 67.5), (33.2, 70), (34.2, 70), (34.2, 54), (23, 54), (23, 70), (28.2, 70), align=None)
    cut_extrude_3_tool2 = extrude(cut_extrude_3_sk2.sketch, amount=-CUT_EXTRUDE_3_REACH, mode=Mode.PRIVATE) & part.part
    add(cut_extrude_3_tool1.solids().sort_by_distance((55.5, 13.8, -68.75))[0], mode=Mode.SUBTRACT)
    add(cut_extrude_3_tool2.solids().sort_by_distance((28.442531, 13.8, -61.493851))[0], mode=Mode.SUBTRACT)

    # Ребро-кромка6 outline → Ребро-кромка6 (cut)
    with BuildSketch(Plane.YZ.offset(SM_START_4)):
        with BuildLine():
            ThreePointArc((12.6, -69.4366), (12.927730969, -68.358657516), (13.8, -67.645555612))
            Line((13.8, -67.645555612), (13.8, -67.5))
            Line((13.8, -67.5), (12.6, -67.5))
            Line((12.6, -67.5), (12.6, -69.4366))
        make_face()
    extrude(amount=SM_EDGE_FLANGE_6_DEPTH, mode=Mode.SUBTRACT)

    # Sm Edge Flange 6 2 outline → Sm Edge Flange 6 2 (cut)
    with BuildSketch(Plane.YZ.offset(SM_START_5)):
        with BuildLine():
            ThreePointArc((12.6, -69.4366), (12.927730969, -68.358657516), (13.8, -67.645555612))
            Line((13.8, -67.645555612), (13.8, -67.5))
            Line((13.8, -67.5), (12.6, -67.5))
            Line((12.6, -67.5), (12.6, -69.4366))
        make_face()
    extrude(amount=SM_EDGE_FLANGE_6_2_DEPTH, mode=Mode.SUBTRACT)

    # Sm Edge Flange 6 3 outline → Sm Edge Flange 6 3 (cut)
    with BuildSketch(Plane.YZ.offset(SM_START_6)):
        with Locations((13.2, -70.0183)):
            Rectangle(SM_EDGE_FLANGE_6_3_OUTLINE_W, SM_EDGE_FLANGE_6_3_OUTLINE_H)
    extrude(amount=SM_EDGE_FLANGE_6_3_DEPTH, mode=Mode.SUBTRACT)

    # Sm Edge Flange 6 4 outline → Sm Edge Flange 6 4 (cut)
    with BuildSketch(Plane.YZ.offset(SM_START_7)):
        with Locations((13.2, -70.0183)):
            Rectangle(SM_EDGE_FLANGE_6_4_OUTLINE_W, SM_EDGE_FLANGE_6_4_OUTLINE_H)
    extrude(amount=SM_EDGE_FLANGE_6_4_DEPTH, mode=Mode.SUBTRACT)

    # Sm Edge Flange 6 5 outline → Sm Edge Flange 6 5 (cut)
    with BuildSketch(Plane.YZ.offset(SM_START_8)):
        with Locations((13.2, -70.0183)):
            Rectangle(SM_EDGE_FLANGE_6_5_OUTLINE_W, SM_EDGE_FLANGE_6_5_OUTLINE_H)
    extrude(amount=SM_EDGE_FLANGE_6_5_DEPTH, mode=Mode.SUBTRACT)

    # Sm Edge Flange 6 6 outline → Sm Edge Flange 6 6 (add)
    with BuildSketch(Plane.YZ.offset(SM_START_4)):
        with BuildLine():
            Line((25.6, -67.5), (14.5366, -67.5))
            ThreePointArc((14.5366, -67.5), (14.161178238, -67.536737358), (13.8, -67.645555612))
            Line((13.8, -67.645555612), (13.8, -69.4366))
            ThreePointArc((13.8, -69.4366), (14.015745145, -68.915745145), (14.5366, -68.7))
            Line((14.5366, -68.7), (25.6, -68.7))
            Line((25.6, -68.7), (25.6, -67.5))
        make_face()
    extrude(amount=SM_EDGE_FLANGE_6_6_DEPTH)

    # Sm Edge Flange 6 7 outline → Sm Edge Flange 6 7 (add)
    with BuildSketch(Plane.YZ.offset(SM_START_5)):
        with BuildLine():
            Line((25.6, -67.5), (14.5366, -67.5))
            ThreePointArc((14.5366, -67.5), (14.161178238, -67.536737358), (13.8, -67.645555612))
            Line((13.8, -67.645555612), (13.8, -69.4366))
            ThreePointArc((13.8, -69.4366), (14.015745145, -68.915745145), (14.5366, -68.7))
            Line((14.5366, -68.7), (25.6, -68.7))
            Line((25.6, -68.7), (25.6, -67.5))
        make_face()
    extrude(amount=SM_EDGE_FLANGE_6_7_DEPTH)

    # Эскиз35 → Вырез-Вытянуть4 (cut, up to next)
    with BuildSketch(Plane.XY.offset(-67.5), mode=Mode.PRIVATE) as cut_extrude_4_sk1:
        with Locations((30.7, 19.6)):
            Circle(SKETCH_35_R)
    cut_extrude_4_tool1 = extrude(cut_extrude_4_sk1.sketch, amount=-CUT_EXTRUDE_4_REACH, mode=Mode.PRIVATE) & part.part
    # Эскиз35 → Вырез-Вытянуть4 (cut, up to next)
    with BuildSketch(Plane.XY.offset(-67.5), mode=Mode.PRIVATE) as cut_extrude_4_sk2:
        with Locations((58.5, 19.6)):
            Circle(SKETCH_35_R)
    cut_extrude_4_tool2 = extrude(cut_extrude_4_sk2.sketch, amount=-CUT_EXTRUDE_4_REACH, mode=Mode.PRIVATE) & part.part
    add(cut_extrude_4_tool1.solids().sort_by_distance((30.7, 19.6, -67.5))[0], mode=Mode.SUBTRACT)
    add(cut_extrude_4_tool2.solids().sort_by_distance((58.5, 19.6, -67.5))[0], mode=Mode.SUBTRACT)

    # Эскиз36 → Вырез-Вытянуть5 (cut, up to next)
    with BuildSketch(Plane(origin=(0, 13.8, 0), x_dir=(1, 0, 0), z_dir=(0, 1, 0)), mode=Mode.PRIVATE) as cut_extrude_5_sk1:
        with Locations(Location((8, 93.4683, 0), (0, 0, 270))):
            Circle(SKETCH_36_R)
    cut_extrude_5_tool1 = extrude(cut_extrude_5_sk1.sketch, amount=-CUT_EXTRUDE_5_REACH, mode=Mode.PRIVATE) & part.part
    # Эскиз36 → Вырез-Вытянуть5 (cut, up to next)
    with BuildSketch(Plane(origin=(0, 13.8, 0), x_dir=(1, 0, 0), z_dir=(0, 1, 0)), mode=Mode.PRIVATE) as cut_extrude_5_sk2:
        with Locations(Location((32, 93.4683, 0), (0, 0, 270))):
            Circle(SKETCH_36_R)
    cut_extrude_5_tool2 = extrude(cut_extrude_5_sk2.sketch, amount=-CUT_EXTRUDE_5_REACH, mode=Mode.PRIVATE) & part.part
    # Эскиз36 → Вырез-Вытянуть5 (cut, up to next)
    with BuildSketch(Plane(origin=(0, 13.8, 0), x_dir=(1, 0, 0), z_dir=(0, 1, 0)), mode=Mode.PRIVATE) as cut_extrude_5_sk3:
        with Locations(Location((8, 6.5317, 0), (0, 0, 90))):
            Circle(SKETCH_36_R)
    cut_extrude_5_tool3 = extrude(cut_extrude_5_sk3.sketch, amount=-CUT_EXTRUDE_5_REACH, mode=Mode.PRIVATE) & part.part
    # Эскиз36 → Вырез-Вытянуть5 (cut, up to next)
    with BuildSketch(Plane(origin=(0, 13.8, 0), x_dir=(1, 0, 0), z_dir=(0, 1, 0)), mode=Mode.PRIVATE) as cut_extrude_5_sk4:
        with Locations(Location((32, 6.5317, 0), (0, 0, 90))):
            Circle(SKETCH_36_R)
    cut_extrude_5_tool4 = extrude(cut_extrude_5_sk4.sketch, amount=-CUT_EXTRUDE_5_REACH, mode=Mode.PRIVATE) & part.part
    add(cut_extrude_5_tool1.solids().sort_by_distance((8, 13.8, -93.4683))[0], mode=Mode.SUBTRACT)
    add(cut_extrude_5_tool2.solids().sort_by_distance((32, 13.8, -93.4683))[0], mode=Mode.SUBTRACT)
    add(cut_extrude_5_tool3.solids().sort_by_distance((8, 13.8, -6.5317))[0], mode=Mode.SUBTRACT)
    add(cut_extrude_5_tool4.solids().sort_by_distance((32, 13.8, -6.5317))[0], mode=Mode.SUBTRACT)


solid = part.part
